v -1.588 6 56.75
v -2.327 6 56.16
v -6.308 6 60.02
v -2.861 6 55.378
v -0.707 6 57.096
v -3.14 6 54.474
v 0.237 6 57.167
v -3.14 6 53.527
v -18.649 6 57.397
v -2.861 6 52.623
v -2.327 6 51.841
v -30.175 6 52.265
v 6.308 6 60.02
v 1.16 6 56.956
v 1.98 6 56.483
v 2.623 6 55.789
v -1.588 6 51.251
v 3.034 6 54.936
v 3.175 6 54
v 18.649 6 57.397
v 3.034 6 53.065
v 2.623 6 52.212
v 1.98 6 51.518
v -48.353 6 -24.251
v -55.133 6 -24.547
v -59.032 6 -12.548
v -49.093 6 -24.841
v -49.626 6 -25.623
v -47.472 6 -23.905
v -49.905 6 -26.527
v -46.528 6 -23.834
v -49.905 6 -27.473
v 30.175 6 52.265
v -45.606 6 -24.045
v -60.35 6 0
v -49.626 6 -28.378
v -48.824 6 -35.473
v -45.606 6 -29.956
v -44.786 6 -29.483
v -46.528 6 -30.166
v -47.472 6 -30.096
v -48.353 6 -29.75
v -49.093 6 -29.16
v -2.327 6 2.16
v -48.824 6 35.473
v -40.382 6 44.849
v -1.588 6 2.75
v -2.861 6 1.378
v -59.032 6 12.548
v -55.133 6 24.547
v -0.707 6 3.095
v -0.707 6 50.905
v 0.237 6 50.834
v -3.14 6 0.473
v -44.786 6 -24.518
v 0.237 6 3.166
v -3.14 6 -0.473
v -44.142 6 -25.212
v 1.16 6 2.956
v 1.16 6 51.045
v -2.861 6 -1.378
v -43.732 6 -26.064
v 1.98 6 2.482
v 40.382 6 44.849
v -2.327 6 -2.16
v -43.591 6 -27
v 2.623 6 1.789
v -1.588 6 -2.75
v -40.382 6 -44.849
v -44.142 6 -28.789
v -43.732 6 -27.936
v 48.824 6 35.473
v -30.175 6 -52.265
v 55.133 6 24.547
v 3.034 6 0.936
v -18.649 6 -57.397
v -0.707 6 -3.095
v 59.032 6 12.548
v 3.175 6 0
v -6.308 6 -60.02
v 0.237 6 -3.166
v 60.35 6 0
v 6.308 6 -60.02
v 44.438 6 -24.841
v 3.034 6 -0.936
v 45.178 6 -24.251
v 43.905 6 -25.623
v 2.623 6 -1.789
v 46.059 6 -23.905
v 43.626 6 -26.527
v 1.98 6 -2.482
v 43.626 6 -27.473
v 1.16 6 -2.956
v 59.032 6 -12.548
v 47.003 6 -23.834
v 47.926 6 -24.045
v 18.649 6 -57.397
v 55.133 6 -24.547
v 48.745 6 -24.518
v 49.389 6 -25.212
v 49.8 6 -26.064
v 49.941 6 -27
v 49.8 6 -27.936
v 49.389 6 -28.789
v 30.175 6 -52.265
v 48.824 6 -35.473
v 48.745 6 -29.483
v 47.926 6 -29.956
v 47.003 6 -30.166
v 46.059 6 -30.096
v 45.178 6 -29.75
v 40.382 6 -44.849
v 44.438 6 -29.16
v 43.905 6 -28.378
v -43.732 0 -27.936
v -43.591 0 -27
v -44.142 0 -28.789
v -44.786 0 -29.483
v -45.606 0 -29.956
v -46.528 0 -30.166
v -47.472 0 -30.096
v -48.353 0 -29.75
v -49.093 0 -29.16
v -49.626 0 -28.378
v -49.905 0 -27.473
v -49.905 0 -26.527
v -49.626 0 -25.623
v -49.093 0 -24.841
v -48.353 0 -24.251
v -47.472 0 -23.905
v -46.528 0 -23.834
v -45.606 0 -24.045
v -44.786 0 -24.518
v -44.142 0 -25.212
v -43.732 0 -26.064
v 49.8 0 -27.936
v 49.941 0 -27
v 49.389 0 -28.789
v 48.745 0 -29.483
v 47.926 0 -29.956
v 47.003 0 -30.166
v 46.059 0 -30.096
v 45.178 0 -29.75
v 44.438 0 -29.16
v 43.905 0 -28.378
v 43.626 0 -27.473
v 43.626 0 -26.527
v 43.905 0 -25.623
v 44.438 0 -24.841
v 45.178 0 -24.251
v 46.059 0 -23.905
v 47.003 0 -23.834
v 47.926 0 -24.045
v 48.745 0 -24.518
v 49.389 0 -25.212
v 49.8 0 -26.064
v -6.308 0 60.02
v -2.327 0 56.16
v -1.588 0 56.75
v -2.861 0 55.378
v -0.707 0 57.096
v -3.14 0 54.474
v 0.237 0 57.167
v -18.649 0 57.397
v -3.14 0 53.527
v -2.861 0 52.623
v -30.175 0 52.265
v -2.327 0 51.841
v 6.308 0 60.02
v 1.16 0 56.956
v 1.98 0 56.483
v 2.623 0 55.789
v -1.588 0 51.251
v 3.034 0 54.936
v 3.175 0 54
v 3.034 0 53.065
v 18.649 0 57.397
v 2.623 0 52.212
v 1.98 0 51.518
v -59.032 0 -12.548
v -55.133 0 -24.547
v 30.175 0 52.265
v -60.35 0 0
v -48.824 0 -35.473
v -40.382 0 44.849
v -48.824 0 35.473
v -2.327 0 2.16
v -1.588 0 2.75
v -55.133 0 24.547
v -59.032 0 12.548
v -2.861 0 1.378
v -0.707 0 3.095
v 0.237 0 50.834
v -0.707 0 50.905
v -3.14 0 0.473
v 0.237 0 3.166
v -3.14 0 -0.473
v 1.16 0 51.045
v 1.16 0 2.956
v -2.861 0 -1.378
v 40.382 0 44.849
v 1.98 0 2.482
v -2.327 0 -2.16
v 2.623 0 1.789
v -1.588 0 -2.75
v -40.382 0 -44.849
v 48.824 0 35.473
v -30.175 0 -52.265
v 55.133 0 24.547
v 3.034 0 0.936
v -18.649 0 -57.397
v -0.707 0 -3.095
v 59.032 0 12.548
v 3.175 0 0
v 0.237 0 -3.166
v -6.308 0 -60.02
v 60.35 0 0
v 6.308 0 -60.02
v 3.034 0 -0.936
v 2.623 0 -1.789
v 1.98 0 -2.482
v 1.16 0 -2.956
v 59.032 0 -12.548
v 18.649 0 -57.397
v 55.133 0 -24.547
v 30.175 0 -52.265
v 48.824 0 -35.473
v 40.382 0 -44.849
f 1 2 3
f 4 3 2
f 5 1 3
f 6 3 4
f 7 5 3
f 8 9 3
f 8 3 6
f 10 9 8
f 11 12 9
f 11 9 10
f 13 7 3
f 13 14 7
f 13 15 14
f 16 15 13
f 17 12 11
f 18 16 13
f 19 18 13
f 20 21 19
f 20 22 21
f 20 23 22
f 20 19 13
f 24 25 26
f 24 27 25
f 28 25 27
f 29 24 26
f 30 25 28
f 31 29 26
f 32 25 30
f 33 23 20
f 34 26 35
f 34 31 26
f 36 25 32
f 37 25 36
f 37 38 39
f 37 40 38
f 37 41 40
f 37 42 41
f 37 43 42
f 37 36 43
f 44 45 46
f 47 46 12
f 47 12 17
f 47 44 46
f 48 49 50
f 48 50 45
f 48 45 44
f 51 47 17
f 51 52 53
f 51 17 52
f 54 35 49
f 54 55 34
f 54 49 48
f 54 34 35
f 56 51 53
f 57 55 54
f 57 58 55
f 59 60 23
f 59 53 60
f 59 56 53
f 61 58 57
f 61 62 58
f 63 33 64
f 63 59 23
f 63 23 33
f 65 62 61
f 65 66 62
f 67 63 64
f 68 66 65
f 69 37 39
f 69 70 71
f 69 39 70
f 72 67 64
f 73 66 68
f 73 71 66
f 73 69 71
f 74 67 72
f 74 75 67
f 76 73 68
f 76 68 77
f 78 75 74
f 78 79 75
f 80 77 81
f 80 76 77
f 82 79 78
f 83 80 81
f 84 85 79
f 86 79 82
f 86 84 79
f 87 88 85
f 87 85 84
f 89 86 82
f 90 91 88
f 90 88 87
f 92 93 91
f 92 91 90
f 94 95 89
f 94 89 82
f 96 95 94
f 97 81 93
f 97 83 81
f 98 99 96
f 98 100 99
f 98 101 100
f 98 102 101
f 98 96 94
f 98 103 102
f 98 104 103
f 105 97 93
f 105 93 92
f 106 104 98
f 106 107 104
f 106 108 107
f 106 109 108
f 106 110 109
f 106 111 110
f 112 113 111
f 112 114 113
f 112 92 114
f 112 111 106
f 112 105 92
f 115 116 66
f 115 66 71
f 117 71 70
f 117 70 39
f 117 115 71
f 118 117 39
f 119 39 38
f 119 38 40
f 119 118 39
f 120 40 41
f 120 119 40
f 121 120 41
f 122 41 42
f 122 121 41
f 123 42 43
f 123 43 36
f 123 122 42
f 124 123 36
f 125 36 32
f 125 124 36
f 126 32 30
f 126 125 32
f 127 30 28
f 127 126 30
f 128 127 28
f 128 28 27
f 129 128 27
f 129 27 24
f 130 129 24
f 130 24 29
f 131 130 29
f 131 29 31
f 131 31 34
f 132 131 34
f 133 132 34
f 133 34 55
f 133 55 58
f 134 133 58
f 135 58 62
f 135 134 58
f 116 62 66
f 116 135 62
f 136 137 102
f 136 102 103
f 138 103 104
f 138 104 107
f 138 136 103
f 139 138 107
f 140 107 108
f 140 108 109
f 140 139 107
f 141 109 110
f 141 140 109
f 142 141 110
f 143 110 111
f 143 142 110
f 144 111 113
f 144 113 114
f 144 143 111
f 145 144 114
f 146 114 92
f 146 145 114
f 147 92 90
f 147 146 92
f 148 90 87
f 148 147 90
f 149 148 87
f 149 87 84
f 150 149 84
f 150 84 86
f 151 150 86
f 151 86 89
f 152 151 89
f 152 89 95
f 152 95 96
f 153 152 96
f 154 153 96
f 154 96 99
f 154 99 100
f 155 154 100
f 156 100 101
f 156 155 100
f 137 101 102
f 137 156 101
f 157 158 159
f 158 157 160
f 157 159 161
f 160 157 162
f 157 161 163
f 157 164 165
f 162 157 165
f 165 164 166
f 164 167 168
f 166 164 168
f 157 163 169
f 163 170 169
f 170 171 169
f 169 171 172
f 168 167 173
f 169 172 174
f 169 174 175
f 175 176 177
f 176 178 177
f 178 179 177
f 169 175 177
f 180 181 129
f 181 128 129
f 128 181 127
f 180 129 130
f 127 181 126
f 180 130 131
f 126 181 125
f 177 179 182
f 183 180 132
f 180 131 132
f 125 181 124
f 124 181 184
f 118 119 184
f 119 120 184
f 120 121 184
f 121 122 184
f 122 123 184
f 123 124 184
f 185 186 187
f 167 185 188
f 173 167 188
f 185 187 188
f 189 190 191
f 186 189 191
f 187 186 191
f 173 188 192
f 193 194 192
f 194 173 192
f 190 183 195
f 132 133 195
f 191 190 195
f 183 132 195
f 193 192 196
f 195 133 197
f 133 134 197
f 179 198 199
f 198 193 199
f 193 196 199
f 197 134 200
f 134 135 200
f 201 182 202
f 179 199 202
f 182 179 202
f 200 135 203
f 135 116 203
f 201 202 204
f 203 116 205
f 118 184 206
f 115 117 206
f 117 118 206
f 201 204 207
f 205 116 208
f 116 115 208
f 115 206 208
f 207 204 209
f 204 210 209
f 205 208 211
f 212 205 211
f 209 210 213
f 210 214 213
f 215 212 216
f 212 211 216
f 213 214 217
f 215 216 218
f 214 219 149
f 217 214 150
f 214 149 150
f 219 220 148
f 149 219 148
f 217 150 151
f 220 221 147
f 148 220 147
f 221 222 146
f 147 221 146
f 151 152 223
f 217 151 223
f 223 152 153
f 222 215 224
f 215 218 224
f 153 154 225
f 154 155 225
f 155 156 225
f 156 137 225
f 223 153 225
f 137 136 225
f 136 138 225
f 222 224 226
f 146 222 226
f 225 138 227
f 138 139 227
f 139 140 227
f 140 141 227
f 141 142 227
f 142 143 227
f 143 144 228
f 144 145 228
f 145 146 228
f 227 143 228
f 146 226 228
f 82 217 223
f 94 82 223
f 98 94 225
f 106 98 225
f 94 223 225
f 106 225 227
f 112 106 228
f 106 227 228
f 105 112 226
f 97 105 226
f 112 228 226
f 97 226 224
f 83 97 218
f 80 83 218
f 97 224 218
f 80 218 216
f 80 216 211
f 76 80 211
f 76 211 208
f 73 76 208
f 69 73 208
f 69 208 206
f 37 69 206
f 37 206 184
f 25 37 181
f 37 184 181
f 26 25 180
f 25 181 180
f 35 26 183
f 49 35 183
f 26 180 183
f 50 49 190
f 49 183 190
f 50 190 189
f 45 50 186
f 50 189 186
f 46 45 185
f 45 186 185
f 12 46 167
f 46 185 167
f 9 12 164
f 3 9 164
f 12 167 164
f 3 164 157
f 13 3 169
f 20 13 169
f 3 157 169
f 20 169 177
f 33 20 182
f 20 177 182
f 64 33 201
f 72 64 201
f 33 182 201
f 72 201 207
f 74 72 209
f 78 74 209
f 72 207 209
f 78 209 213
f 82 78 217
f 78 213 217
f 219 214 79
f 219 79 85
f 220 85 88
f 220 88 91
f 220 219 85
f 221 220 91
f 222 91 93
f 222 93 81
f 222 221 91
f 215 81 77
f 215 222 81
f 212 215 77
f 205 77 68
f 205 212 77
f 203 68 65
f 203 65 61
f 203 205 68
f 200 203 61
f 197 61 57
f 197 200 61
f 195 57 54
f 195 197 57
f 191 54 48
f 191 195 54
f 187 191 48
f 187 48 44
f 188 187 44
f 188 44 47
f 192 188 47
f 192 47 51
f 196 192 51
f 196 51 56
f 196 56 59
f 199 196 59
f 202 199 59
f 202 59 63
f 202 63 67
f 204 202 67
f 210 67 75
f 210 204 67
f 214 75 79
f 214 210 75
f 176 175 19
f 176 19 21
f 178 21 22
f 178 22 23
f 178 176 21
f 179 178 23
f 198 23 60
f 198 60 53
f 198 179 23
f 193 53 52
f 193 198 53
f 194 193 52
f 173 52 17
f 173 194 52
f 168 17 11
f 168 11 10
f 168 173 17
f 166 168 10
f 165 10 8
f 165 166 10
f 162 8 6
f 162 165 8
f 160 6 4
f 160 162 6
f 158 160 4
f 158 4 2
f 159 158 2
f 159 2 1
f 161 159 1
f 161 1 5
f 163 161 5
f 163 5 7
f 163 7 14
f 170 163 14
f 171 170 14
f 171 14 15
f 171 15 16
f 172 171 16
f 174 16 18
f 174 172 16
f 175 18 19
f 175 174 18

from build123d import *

# Parameters (mm, degrees)
SKETCH1_R           = 60.3504
SKETCH1_R_2         = 3.175
BOSS_EXTRUDE1_DEPTH = 6


with BuildPart() as part:
    # Sketch1 → Boss-Extrude1 (new body)
    with BuildSketch(Plane(origin=(0, 0, 0), x_dir=(1, 0, 0), z_dir=(0, 1, 0))):
        Circle(SKETCH1_R)
        Circle(SKETCH1_R_2, mode=Mode.SUBTRACT)
        with Locations((0, -54.0004)):
            Circle(SKETCH1_R_2, mode=Mode.SUBTRACT)
        with Locations((-46.765718215, 27.0002)):
            Circle(SKETCH1_R_2, mode=Mode.SUBTRACT)
        with Locations((46.765718215, 27.0002)):
            Circle(SKETCH1_R_2, mode=Mode.SUBTRACT)
    extrude(amount=BOSS_EXTRUDE1_DEPTH)


solid = part.part
